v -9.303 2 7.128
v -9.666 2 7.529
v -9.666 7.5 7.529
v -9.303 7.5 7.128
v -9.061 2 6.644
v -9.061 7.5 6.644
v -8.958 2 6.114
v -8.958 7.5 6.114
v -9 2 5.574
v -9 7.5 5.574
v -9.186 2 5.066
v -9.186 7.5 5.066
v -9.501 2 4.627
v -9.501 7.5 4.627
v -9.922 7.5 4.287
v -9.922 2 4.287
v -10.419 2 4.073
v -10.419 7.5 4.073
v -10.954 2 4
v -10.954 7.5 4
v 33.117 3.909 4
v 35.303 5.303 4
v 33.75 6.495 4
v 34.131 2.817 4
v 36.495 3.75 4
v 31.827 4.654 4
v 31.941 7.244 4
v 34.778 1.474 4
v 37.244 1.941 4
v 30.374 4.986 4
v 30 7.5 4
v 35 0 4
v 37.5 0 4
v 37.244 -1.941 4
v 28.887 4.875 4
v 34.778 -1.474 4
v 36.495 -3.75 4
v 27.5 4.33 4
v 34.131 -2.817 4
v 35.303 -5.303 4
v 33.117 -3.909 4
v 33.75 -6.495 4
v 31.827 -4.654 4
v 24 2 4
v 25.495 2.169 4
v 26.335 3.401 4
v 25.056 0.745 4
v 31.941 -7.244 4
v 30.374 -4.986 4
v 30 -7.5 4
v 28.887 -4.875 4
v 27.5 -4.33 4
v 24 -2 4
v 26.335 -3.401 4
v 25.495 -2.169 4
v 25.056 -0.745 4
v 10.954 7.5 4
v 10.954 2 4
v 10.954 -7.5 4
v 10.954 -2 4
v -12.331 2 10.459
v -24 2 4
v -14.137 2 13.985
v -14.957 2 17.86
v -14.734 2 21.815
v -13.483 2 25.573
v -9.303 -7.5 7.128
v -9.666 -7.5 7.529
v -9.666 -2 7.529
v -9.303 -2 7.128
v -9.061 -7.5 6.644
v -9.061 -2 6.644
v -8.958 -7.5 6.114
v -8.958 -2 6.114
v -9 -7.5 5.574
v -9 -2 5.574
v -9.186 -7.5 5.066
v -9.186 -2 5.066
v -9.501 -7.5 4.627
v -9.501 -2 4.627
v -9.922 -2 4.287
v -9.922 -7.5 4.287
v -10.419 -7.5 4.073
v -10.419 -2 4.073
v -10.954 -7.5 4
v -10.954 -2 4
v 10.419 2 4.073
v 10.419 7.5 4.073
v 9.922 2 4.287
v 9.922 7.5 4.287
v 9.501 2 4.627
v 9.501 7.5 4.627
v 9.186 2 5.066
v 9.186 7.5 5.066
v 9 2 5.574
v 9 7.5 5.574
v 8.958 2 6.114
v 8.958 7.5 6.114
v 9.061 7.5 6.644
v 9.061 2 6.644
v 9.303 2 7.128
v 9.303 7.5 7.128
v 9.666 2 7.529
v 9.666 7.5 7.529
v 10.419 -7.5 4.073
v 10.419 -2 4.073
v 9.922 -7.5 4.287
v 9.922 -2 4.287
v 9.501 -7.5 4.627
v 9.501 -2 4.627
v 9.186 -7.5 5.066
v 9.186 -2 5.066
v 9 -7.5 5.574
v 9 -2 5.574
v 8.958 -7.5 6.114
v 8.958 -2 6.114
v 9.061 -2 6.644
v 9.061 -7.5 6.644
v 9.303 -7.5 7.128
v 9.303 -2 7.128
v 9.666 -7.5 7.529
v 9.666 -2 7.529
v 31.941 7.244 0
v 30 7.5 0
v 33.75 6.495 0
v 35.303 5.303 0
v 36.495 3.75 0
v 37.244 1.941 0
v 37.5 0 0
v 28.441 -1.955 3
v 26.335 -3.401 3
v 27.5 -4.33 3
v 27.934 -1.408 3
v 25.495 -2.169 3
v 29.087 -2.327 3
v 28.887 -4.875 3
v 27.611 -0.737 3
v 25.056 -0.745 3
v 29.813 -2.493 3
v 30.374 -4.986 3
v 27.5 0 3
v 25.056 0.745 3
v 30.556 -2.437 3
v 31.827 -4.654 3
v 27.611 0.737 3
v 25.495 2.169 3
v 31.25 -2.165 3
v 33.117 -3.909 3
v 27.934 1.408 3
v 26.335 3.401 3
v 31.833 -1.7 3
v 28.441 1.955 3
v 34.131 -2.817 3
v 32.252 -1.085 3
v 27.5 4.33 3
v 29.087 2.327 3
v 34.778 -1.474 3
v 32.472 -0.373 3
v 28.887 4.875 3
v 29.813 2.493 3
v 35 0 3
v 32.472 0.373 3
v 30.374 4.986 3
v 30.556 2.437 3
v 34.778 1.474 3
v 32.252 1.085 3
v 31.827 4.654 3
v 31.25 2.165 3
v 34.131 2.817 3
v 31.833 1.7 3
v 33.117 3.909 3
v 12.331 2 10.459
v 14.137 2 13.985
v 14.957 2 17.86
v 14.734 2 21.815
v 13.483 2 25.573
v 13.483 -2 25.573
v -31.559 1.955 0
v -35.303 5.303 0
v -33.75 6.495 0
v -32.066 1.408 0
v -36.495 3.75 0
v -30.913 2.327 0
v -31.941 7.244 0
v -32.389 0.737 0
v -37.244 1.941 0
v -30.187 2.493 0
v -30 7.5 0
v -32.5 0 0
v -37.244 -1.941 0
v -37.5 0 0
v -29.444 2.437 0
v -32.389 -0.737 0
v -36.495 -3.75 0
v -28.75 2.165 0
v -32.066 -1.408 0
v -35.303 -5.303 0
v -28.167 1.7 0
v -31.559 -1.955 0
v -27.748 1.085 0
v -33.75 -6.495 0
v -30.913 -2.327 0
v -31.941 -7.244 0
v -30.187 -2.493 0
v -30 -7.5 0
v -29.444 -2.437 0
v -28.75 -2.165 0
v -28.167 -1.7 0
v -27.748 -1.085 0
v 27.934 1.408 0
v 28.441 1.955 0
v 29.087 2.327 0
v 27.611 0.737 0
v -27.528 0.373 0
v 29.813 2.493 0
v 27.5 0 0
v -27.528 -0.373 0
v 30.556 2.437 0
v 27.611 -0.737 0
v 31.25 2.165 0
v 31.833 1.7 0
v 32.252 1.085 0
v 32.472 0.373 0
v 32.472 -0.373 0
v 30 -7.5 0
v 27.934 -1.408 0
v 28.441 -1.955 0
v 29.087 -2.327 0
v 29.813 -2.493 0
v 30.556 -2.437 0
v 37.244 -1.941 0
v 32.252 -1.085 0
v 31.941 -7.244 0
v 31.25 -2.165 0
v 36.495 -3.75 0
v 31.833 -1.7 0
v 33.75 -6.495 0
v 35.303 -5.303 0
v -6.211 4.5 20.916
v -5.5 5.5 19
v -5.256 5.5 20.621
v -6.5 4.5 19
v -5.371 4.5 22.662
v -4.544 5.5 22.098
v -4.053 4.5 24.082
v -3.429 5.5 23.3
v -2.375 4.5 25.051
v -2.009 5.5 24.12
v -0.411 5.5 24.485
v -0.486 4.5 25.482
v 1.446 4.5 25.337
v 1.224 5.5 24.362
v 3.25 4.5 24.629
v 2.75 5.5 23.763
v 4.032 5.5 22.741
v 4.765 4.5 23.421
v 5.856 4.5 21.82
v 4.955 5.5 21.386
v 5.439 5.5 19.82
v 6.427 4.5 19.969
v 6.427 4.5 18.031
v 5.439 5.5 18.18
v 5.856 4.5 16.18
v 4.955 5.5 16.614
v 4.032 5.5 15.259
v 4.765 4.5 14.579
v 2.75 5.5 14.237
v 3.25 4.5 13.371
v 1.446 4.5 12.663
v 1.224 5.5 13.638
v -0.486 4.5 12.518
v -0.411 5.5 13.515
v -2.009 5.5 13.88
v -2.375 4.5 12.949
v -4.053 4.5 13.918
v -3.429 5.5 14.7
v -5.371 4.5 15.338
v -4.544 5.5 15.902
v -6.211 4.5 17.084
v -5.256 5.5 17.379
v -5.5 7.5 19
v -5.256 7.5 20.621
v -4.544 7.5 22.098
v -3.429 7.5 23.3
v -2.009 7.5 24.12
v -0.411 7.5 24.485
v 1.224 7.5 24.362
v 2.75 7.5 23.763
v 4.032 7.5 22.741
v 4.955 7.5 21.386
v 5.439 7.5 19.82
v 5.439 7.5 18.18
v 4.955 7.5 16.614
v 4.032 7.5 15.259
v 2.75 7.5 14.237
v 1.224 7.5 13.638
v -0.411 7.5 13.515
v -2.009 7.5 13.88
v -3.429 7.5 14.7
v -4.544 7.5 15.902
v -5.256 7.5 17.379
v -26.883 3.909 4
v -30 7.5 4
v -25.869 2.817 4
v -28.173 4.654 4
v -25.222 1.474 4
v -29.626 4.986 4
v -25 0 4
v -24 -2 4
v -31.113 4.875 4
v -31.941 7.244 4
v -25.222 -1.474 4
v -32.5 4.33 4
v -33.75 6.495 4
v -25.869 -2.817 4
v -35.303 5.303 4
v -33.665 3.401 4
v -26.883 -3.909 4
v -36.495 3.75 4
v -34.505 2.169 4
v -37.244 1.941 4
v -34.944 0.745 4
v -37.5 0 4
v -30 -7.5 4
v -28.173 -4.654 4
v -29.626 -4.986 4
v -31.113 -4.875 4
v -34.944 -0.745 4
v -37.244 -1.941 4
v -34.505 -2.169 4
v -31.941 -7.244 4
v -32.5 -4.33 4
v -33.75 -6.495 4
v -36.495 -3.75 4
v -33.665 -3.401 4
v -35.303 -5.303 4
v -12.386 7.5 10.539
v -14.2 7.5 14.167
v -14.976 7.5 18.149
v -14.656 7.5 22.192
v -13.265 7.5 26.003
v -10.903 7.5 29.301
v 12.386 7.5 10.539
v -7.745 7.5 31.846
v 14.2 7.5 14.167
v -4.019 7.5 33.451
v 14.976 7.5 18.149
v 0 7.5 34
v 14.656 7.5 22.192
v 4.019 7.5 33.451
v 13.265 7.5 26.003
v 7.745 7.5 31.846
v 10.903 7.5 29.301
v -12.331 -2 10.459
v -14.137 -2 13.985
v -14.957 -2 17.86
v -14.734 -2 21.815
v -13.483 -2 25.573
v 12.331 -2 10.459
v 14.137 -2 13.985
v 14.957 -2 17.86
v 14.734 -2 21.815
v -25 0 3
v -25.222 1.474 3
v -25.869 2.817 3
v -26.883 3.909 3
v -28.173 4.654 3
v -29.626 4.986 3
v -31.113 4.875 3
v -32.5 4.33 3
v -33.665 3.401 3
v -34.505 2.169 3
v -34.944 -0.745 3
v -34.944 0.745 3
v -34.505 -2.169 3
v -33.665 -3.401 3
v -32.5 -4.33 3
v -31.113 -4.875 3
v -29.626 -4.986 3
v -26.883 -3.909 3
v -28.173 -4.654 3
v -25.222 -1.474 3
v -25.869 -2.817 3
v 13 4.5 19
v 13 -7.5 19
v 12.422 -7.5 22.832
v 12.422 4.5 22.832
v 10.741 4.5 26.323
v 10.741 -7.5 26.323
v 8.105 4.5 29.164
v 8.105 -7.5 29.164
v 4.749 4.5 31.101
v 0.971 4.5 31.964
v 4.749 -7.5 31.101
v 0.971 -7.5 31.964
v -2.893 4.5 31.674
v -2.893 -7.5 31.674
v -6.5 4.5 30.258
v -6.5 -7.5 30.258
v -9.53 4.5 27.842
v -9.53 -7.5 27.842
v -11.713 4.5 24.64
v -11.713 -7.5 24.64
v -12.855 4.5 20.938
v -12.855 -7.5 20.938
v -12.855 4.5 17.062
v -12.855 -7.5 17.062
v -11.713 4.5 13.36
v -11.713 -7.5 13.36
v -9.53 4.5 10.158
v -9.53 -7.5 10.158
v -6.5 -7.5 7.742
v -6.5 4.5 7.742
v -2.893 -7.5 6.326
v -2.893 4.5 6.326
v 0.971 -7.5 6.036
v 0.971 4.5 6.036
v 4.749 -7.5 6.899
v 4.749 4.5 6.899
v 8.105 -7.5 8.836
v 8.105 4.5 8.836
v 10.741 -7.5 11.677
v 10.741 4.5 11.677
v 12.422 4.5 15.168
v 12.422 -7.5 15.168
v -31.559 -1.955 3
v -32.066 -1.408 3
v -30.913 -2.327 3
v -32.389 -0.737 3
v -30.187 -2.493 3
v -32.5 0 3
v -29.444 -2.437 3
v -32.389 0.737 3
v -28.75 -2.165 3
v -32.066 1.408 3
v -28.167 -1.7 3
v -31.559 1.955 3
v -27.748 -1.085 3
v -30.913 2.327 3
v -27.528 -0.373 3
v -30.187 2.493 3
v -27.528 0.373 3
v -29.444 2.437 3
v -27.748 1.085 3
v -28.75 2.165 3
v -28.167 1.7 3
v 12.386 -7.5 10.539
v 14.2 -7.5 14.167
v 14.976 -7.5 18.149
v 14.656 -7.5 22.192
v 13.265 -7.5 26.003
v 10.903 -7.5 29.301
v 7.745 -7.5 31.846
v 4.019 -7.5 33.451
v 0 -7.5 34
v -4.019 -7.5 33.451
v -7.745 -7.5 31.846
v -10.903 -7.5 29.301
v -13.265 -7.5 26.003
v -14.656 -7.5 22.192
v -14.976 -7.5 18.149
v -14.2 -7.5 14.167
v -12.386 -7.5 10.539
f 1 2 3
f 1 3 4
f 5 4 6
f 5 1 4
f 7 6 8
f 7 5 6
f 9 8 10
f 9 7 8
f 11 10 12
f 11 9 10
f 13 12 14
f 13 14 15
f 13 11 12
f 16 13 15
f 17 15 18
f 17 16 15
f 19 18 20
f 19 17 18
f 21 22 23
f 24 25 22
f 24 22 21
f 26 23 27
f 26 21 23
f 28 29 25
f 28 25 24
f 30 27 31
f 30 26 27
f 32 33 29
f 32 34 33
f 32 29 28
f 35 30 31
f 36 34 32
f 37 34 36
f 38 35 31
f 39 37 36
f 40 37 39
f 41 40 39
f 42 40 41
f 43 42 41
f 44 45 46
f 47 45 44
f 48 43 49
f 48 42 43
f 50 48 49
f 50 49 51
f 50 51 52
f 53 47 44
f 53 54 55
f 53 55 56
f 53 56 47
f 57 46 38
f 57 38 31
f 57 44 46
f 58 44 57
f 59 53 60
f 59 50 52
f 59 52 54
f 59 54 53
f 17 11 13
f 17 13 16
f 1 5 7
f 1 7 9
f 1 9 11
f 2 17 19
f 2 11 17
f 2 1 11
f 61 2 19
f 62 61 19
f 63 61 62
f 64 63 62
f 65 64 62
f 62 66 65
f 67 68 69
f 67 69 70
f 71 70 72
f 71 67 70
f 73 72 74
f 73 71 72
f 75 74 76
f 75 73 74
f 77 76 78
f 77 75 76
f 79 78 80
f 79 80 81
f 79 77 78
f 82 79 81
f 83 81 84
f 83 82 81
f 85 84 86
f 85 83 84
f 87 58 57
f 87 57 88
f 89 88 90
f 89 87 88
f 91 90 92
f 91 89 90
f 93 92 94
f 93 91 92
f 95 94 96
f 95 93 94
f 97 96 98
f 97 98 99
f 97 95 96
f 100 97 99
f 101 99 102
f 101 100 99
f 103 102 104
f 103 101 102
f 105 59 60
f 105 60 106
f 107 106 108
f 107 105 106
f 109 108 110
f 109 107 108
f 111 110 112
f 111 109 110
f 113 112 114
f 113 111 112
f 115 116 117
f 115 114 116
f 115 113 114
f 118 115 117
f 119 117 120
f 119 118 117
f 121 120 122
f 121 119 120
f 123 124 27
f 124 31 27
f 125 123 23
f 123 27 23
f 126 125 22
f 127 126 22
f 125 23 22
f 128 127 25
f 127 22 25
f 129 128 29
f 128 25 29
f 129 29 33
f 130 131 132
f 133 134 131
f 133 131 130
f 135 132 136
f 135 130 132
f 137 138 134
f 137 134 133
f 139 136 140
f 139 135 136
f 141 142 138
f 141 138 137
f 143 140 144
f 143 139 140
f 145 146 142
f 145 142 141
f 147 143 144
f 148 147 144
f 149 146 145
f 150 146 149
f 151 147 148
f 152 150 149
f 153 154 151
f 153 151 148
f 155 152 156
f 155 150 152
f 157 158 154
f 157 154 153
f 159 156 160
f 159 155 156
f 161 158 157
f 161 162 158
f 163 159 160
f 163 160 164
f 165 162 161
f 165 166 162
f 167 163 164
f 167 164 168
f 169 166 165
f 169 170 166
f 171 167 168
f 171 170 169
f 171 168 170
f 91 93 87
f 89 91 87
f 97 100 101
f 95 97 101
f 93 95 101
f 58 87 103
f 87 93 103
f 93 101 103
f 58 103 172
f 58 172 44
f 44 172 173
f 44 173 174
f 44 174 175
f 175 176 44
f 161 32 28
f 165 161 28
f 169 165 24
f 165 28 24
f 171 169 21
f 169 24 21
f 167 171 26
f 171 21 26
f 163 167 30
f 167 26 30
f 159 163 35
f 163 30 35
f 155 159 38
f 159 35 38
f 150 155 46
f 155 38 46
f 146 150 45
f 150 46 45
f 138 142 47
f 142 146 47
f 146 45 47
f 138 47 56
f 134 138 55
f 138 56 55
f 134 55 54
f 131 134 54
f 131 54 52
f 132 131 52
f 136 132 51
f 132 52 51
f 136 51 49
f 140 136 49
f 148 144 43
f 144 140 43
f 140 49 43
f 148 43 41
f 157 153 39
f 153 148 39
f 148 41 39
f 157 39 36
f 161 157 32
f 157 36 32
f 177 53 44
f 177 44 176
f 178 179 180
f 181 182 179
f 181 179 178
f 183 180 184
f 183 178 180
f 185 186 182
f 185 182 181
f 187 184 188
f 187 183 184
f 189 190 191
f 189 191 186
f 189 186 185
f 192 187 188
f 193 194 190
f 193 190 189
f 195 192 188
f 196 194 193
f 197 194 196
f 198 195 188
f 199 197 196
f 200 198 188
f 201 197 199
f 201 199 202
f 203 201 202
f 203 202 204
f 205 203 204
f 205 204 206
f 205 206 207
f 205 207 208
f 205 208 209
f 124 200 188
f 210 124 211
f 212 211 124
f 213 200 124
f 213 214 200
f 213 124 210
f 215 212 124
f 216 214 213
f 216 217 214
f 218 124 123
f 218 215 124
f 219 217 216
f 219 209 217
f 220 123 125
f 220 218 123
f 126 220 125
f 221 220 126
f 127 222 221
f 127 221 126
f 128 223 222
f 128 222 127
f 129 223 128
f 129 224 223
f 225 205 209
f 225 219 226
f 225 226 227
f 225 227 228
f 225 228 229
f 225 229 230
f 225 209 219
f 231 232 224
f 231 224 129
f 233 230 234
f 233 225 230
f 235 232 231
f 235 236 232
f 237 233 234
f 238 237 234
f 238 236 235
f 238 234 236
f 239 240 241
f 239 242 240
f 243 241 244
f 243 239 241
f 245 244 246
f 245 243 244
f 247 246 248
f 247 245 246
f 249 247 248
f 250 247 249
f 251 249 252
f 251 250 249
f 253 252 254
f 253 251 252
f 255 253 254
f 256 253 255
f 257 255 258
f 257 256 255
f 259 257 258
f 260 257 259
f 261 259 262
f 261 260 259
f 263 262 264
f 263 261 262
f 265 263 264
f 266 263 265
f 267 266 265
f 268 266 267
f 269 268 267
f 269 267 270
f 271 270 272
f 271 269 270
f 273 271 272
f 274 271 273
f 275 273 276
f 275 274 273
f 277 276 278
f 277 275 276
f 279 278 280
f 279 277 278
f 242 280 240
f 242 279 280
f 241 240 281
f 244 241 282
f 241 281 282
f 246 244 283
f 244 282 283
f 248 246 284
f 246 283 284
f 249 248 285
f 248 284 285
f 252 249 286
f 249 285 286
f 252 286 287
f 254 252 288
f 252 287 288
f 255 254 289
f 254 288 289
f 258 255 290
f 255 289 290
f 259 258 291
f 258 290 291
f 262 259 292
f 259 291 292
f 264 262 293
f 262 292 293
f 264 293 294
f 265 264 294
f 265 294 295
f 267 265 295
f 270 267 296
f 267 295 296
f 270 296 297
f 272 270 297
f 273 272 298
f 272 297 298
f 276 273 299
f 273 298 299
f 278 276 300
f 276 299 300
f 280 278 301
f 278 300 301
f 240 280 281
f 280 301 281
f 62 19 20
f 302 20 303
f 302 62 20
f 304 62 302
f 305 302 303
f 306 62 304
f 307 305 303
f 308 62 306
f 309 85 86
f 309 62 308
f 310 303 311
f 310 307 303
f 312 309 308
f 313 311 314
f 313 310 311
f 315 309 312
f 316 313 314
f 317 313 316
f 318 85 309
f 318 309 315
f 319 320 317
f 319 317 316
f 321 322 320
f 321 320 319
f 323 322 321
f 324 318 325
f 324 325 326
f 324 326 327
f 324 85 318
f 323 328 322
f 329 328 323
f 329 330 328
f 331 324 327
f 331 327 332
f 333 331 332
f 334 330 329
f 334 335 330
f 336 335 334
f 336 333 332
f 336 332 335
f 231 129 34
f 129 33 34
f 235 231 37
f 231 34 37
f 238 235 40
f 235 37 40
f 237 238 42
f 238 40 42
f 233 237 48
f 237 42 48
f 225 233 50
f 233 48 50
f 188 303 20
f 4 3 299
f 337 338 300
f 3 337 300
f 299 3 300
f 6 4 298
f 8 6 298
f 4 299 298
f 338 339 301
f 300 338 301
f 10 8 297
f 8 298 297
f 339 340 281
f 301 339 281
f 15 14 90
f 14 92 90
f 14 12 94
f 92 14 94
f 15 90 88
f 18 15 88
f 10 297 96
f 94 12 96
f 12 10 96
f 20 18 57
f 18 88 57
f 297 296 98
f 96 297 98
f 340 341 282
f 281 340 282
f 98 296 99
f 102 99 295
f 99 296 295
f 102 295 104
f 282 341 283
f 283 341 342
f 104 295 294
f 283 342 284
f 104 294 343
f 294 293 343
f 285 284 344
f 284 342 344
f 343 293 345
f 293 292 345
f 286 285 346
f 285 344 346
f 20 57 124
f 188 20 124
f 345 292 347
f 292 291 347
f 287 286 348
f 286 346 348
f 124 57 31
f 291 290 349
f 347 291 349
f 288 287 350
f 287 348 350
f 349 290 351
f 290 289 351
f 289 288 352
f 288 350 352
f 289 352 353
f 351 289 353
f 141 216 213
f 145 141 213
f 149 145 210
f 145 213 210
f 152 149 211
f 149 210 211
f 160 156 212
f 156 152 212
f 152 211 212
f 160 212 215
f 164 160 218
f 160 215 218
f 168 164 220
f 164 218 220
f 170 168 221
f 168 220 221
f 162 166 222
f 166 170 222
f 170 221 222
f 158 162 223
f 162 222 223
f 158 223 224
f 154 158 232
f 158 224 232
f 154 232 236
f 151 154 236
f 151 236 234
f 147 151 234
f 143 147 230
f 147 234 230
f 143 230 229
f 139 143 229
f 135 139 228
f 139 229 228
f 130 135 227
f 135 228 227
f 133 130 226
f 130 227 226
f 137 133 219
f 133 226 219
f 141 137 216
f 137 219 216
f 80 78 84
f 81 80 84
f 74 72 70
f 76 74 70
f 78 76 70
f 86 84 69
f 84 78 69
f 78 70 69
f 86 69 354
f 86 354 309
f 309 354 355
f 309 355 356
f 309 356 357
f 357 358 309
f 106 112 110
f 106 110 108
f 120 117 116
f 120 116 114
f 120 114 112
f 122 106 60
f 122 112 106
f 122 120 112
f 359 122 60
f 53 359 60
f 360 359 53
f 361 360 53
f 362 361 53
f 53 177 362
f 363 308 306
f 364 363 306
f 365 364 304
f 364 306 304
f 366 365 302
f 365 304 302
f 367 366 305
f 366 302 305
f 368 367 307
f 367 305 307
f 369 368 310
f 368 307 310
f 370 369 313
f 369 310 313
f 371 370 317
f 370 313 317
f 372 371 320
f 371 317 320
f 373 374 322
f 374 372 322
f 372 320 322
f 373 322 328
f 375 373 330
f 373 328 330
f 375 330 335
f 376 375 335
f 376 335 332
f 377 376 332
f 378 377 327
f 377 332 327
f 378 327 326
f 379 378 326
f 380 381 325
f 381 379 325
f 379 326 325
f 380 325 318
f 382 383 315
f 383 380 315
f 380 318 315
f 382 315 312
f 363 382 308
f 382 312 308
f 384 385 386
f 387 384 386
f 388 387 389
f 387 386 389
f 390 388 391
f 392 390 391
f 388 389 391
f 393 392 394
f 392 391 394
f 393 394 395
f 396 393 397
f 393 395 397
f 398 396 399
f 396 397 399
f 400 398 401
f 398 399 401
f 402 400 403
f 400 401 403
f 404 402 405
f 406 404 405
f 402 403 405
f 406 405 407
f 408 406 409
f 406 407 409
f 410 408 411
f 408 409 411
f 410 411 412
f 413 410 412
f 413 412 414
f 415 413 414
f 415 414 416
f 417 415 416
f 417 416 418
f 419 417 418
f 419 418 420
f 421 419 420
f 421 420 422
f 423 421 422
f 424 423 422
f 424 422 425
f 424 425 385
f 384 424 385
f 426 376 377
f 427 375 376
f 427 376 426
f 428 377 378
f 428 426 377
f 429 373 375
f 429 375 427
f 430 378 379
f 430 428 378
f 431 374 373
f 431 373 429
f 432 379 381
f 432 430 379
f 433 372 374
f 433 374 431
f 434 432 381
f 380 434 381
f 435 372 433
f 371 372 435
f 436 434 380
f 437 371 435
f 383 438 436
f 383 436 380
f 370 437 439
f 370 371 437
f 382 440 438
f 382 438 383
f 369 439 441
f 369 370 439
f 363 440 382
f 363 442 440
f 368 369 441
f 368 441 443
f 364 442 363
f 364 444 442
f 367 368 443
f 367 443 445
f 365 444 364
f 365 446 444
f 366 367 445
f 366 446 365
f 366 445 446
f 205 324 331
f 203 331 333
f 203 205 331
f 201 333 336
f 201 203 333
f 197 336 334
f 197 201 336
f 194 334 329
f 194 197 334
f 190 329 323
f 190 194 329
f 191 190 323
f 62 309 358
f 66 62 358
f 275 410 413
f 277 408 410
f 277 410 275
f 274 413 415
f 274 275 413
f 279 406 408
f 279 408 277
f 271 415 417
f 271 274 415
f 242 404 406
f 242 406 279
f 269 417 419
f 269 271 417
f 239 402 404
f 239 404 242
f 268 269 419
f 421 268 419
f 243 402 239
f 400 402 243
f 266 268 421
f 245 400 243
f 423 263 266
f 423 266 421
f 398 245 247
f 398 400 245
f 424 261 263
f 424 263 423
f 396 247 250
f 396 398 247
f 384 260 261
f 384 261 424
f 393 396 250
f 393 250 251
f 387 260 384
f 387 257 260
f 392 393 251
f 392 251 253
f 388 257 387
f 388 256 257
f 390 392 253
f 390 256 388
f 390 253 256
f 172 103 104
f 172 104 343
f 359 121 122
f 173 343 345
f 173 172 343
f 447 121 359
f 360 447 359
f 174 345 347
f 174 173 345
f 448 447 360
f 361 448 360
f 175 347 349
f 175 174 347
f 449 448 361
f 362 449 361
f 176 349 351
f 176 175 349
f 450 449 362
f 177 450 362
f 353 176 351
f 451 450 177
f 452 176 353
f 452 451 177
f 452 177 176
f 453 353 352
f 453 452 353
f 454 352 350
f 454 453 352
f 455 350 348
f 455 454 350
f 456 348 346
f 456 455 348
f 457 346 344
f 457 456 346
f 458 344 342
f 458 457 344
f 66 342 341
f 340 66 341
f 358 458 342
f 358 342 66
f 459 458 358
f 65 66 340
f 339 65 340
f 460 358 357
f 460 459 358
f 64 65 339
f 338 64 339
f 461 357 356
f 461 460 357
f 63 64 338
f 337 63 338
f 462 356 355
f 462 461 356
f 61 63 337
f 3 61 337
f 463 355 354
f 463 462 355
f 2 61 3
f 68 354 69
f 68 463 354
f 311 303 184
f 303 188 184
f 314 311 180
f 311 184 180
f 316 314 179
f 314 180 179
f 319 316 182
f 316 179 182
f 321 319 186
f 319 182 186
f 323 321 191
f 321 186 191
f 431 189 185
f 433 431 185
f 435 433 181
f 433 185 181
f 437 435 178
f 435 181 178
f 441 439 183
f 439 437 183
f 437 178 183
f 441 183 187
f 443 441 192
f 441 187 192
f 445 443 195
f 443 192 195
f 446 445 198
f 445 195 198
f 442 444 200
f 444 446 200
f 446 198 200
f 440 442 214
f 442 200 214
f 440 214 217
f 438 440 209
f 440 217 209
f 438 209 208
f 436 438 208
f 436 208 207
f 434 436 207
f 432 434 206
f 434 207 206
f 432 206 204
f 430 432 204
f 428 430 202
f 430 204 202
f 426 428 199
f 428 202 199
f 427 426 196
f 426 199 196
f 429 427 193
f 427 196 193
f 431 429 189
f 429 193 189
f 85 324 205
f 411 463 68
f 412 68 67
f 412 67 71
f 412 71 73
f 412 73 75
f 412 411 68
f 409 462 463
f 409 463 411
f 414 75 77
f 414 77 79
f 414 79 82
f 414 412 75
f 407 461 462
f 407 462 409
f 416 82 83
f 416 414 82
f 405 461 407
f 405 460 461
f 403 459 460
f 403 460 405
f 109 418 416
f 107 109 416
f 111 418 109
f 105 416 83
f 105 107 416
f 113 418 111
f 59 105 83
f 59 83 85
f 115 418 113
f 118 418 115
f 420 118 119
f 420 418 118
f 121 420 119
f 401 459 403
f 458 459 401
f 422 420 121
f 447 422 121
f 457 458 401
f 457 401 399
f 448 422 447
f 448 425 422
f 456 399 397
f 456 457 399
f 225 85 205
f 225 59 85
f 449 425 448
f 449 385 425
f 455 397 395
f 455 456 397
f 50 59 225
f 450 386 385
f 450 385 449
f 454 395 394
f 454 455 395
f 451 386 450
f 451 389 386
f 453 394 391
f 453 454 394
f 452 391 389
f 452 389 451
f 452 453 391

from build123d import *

# Parameters (mm, degrees)
F2_DEPTH       = 7.5
F3_R           = 13
F4_DEPTH       = 12
F5_R           = 5.5
F6_DEPTH       = 15.001
F7_R           = 7.49999
F9_D           = 5
F9_CBORE_D     = 10
F9_CBORE_DEPTH = 1
F11_DEPTH      = 2
F12_SIZE       = 1


# Not quite as in the source:
# - a fillet or chamfer is up to 0.001 mm smaller than in the source, because OpenCascade refuses the exact size


with BuildPart() as f2:
    # F1 (on Front) → F2 (new body, symmetric)
    with BuildSketch(Plane.XZ):
        with BuildLine():
            Line((-37.5, 0), (0, 0))
            Line((0, 0), (37.5, 0))
            Line((37.5, 0), (37.5, 4))
            Line((37.5, 4), (10.9544511501, 4))
            ThreePointArc((10.9544511501, 4), (9.0757782768, 5.3140056594), (9.6656921913, 7.5294117647))
            ThreePointArc((9.6656921913, 7.5294117647), (14.0900465494, 24.1449575543), (0, 34))
            ThreePointArc((0, 34), (-14.0900465494, 24.1449575543), (-9.6656921913, 7.5294117647))
            ThreePointArc((-9.6656921913, 7.5294117647), (-9.0757782768, 5.3140056594), (-10.9544511501, 4))
            Line((-10.9544511501, 4), (-37.5, 4))
            Line((-37.5, 4), (-37.5, 0))
        make_face()
    extrude(amount=F2_DEPTH, both=True)

    # F3 (on face) → F4 (cut)
    with BuildSketch(Plane.XZ.offset(7.5)):
        with Locations((0, 19)):
            Circle(F3_R)
    extrude(amount=-F4_DEPTH, mode=Mode.SUBTRACT)

    # F5 (on face) → F6 (cut, through all)
    with BuildSketch(Plane(origin=(0, 7.5, 0), x_dir=(-1, 0, 0), z_dir=(0, 1, 0))):
        with Locations((0, 19)):
            Circle(F5_R)
    extrude(amount=-F6_DEPTH, mode=Mode.SUBTRACT)

    # F7 (radius 7.5 in the source; OpenCascade refuses exactly that, so slightly less here)
    f7_edges = [f2.edges().sort_by_distance(p)[0] for p in [
        (37.5, -7.5, 2),
        (37.5, 7.5, 2),
        (-37.5, -7.5, 2),
        (-37.5, 7.5, 2),
    ]]
    fillet(f7_edges, radius=F7_R)

    # F9 (through all)
    with Locations(Plane.XY.offset(4)):
        with Locations((30, 0), (-30, 0)):
            CounterBoreHole(F9_D / 2, F9_CBORE_D / 2, F9_CBORE_DEPTH)

    # F10 (on Front) → F11 (join, symmetric)
    with BuildSketch(Plane.XZ):
        with BuildLine():
            Line((10.9544511501, 4), (24, 4))
            Line((24, 4), (13.4831460674, 25.5730337079))
            ThreePointArc((13.4831460674, 25.5730337079), (14.6751576274, 15.8952055444), (9.6656921913, 7.5294117647))
            ThreePointArc((9.6656921913, 7.5294117647), (9.0757782768, 5.3140056594), (10.9544511501, 4))
        make_face()
    extrude(amount=F11_DEPTH, both=True)

    # F12
    f12_edges = [f2.edges().sort_by_distance(p)[0] for p in [
        (5.5, 4.5, 19),
    ]]
    chamfer(f12_edges, length=F12_SIZE)

    # F13: F2 across plane


with BuildPart() as f2_1:
    add(f2.part)
    add(f2.part.mirror(Plane.YZ))


solid = f2_1.part
